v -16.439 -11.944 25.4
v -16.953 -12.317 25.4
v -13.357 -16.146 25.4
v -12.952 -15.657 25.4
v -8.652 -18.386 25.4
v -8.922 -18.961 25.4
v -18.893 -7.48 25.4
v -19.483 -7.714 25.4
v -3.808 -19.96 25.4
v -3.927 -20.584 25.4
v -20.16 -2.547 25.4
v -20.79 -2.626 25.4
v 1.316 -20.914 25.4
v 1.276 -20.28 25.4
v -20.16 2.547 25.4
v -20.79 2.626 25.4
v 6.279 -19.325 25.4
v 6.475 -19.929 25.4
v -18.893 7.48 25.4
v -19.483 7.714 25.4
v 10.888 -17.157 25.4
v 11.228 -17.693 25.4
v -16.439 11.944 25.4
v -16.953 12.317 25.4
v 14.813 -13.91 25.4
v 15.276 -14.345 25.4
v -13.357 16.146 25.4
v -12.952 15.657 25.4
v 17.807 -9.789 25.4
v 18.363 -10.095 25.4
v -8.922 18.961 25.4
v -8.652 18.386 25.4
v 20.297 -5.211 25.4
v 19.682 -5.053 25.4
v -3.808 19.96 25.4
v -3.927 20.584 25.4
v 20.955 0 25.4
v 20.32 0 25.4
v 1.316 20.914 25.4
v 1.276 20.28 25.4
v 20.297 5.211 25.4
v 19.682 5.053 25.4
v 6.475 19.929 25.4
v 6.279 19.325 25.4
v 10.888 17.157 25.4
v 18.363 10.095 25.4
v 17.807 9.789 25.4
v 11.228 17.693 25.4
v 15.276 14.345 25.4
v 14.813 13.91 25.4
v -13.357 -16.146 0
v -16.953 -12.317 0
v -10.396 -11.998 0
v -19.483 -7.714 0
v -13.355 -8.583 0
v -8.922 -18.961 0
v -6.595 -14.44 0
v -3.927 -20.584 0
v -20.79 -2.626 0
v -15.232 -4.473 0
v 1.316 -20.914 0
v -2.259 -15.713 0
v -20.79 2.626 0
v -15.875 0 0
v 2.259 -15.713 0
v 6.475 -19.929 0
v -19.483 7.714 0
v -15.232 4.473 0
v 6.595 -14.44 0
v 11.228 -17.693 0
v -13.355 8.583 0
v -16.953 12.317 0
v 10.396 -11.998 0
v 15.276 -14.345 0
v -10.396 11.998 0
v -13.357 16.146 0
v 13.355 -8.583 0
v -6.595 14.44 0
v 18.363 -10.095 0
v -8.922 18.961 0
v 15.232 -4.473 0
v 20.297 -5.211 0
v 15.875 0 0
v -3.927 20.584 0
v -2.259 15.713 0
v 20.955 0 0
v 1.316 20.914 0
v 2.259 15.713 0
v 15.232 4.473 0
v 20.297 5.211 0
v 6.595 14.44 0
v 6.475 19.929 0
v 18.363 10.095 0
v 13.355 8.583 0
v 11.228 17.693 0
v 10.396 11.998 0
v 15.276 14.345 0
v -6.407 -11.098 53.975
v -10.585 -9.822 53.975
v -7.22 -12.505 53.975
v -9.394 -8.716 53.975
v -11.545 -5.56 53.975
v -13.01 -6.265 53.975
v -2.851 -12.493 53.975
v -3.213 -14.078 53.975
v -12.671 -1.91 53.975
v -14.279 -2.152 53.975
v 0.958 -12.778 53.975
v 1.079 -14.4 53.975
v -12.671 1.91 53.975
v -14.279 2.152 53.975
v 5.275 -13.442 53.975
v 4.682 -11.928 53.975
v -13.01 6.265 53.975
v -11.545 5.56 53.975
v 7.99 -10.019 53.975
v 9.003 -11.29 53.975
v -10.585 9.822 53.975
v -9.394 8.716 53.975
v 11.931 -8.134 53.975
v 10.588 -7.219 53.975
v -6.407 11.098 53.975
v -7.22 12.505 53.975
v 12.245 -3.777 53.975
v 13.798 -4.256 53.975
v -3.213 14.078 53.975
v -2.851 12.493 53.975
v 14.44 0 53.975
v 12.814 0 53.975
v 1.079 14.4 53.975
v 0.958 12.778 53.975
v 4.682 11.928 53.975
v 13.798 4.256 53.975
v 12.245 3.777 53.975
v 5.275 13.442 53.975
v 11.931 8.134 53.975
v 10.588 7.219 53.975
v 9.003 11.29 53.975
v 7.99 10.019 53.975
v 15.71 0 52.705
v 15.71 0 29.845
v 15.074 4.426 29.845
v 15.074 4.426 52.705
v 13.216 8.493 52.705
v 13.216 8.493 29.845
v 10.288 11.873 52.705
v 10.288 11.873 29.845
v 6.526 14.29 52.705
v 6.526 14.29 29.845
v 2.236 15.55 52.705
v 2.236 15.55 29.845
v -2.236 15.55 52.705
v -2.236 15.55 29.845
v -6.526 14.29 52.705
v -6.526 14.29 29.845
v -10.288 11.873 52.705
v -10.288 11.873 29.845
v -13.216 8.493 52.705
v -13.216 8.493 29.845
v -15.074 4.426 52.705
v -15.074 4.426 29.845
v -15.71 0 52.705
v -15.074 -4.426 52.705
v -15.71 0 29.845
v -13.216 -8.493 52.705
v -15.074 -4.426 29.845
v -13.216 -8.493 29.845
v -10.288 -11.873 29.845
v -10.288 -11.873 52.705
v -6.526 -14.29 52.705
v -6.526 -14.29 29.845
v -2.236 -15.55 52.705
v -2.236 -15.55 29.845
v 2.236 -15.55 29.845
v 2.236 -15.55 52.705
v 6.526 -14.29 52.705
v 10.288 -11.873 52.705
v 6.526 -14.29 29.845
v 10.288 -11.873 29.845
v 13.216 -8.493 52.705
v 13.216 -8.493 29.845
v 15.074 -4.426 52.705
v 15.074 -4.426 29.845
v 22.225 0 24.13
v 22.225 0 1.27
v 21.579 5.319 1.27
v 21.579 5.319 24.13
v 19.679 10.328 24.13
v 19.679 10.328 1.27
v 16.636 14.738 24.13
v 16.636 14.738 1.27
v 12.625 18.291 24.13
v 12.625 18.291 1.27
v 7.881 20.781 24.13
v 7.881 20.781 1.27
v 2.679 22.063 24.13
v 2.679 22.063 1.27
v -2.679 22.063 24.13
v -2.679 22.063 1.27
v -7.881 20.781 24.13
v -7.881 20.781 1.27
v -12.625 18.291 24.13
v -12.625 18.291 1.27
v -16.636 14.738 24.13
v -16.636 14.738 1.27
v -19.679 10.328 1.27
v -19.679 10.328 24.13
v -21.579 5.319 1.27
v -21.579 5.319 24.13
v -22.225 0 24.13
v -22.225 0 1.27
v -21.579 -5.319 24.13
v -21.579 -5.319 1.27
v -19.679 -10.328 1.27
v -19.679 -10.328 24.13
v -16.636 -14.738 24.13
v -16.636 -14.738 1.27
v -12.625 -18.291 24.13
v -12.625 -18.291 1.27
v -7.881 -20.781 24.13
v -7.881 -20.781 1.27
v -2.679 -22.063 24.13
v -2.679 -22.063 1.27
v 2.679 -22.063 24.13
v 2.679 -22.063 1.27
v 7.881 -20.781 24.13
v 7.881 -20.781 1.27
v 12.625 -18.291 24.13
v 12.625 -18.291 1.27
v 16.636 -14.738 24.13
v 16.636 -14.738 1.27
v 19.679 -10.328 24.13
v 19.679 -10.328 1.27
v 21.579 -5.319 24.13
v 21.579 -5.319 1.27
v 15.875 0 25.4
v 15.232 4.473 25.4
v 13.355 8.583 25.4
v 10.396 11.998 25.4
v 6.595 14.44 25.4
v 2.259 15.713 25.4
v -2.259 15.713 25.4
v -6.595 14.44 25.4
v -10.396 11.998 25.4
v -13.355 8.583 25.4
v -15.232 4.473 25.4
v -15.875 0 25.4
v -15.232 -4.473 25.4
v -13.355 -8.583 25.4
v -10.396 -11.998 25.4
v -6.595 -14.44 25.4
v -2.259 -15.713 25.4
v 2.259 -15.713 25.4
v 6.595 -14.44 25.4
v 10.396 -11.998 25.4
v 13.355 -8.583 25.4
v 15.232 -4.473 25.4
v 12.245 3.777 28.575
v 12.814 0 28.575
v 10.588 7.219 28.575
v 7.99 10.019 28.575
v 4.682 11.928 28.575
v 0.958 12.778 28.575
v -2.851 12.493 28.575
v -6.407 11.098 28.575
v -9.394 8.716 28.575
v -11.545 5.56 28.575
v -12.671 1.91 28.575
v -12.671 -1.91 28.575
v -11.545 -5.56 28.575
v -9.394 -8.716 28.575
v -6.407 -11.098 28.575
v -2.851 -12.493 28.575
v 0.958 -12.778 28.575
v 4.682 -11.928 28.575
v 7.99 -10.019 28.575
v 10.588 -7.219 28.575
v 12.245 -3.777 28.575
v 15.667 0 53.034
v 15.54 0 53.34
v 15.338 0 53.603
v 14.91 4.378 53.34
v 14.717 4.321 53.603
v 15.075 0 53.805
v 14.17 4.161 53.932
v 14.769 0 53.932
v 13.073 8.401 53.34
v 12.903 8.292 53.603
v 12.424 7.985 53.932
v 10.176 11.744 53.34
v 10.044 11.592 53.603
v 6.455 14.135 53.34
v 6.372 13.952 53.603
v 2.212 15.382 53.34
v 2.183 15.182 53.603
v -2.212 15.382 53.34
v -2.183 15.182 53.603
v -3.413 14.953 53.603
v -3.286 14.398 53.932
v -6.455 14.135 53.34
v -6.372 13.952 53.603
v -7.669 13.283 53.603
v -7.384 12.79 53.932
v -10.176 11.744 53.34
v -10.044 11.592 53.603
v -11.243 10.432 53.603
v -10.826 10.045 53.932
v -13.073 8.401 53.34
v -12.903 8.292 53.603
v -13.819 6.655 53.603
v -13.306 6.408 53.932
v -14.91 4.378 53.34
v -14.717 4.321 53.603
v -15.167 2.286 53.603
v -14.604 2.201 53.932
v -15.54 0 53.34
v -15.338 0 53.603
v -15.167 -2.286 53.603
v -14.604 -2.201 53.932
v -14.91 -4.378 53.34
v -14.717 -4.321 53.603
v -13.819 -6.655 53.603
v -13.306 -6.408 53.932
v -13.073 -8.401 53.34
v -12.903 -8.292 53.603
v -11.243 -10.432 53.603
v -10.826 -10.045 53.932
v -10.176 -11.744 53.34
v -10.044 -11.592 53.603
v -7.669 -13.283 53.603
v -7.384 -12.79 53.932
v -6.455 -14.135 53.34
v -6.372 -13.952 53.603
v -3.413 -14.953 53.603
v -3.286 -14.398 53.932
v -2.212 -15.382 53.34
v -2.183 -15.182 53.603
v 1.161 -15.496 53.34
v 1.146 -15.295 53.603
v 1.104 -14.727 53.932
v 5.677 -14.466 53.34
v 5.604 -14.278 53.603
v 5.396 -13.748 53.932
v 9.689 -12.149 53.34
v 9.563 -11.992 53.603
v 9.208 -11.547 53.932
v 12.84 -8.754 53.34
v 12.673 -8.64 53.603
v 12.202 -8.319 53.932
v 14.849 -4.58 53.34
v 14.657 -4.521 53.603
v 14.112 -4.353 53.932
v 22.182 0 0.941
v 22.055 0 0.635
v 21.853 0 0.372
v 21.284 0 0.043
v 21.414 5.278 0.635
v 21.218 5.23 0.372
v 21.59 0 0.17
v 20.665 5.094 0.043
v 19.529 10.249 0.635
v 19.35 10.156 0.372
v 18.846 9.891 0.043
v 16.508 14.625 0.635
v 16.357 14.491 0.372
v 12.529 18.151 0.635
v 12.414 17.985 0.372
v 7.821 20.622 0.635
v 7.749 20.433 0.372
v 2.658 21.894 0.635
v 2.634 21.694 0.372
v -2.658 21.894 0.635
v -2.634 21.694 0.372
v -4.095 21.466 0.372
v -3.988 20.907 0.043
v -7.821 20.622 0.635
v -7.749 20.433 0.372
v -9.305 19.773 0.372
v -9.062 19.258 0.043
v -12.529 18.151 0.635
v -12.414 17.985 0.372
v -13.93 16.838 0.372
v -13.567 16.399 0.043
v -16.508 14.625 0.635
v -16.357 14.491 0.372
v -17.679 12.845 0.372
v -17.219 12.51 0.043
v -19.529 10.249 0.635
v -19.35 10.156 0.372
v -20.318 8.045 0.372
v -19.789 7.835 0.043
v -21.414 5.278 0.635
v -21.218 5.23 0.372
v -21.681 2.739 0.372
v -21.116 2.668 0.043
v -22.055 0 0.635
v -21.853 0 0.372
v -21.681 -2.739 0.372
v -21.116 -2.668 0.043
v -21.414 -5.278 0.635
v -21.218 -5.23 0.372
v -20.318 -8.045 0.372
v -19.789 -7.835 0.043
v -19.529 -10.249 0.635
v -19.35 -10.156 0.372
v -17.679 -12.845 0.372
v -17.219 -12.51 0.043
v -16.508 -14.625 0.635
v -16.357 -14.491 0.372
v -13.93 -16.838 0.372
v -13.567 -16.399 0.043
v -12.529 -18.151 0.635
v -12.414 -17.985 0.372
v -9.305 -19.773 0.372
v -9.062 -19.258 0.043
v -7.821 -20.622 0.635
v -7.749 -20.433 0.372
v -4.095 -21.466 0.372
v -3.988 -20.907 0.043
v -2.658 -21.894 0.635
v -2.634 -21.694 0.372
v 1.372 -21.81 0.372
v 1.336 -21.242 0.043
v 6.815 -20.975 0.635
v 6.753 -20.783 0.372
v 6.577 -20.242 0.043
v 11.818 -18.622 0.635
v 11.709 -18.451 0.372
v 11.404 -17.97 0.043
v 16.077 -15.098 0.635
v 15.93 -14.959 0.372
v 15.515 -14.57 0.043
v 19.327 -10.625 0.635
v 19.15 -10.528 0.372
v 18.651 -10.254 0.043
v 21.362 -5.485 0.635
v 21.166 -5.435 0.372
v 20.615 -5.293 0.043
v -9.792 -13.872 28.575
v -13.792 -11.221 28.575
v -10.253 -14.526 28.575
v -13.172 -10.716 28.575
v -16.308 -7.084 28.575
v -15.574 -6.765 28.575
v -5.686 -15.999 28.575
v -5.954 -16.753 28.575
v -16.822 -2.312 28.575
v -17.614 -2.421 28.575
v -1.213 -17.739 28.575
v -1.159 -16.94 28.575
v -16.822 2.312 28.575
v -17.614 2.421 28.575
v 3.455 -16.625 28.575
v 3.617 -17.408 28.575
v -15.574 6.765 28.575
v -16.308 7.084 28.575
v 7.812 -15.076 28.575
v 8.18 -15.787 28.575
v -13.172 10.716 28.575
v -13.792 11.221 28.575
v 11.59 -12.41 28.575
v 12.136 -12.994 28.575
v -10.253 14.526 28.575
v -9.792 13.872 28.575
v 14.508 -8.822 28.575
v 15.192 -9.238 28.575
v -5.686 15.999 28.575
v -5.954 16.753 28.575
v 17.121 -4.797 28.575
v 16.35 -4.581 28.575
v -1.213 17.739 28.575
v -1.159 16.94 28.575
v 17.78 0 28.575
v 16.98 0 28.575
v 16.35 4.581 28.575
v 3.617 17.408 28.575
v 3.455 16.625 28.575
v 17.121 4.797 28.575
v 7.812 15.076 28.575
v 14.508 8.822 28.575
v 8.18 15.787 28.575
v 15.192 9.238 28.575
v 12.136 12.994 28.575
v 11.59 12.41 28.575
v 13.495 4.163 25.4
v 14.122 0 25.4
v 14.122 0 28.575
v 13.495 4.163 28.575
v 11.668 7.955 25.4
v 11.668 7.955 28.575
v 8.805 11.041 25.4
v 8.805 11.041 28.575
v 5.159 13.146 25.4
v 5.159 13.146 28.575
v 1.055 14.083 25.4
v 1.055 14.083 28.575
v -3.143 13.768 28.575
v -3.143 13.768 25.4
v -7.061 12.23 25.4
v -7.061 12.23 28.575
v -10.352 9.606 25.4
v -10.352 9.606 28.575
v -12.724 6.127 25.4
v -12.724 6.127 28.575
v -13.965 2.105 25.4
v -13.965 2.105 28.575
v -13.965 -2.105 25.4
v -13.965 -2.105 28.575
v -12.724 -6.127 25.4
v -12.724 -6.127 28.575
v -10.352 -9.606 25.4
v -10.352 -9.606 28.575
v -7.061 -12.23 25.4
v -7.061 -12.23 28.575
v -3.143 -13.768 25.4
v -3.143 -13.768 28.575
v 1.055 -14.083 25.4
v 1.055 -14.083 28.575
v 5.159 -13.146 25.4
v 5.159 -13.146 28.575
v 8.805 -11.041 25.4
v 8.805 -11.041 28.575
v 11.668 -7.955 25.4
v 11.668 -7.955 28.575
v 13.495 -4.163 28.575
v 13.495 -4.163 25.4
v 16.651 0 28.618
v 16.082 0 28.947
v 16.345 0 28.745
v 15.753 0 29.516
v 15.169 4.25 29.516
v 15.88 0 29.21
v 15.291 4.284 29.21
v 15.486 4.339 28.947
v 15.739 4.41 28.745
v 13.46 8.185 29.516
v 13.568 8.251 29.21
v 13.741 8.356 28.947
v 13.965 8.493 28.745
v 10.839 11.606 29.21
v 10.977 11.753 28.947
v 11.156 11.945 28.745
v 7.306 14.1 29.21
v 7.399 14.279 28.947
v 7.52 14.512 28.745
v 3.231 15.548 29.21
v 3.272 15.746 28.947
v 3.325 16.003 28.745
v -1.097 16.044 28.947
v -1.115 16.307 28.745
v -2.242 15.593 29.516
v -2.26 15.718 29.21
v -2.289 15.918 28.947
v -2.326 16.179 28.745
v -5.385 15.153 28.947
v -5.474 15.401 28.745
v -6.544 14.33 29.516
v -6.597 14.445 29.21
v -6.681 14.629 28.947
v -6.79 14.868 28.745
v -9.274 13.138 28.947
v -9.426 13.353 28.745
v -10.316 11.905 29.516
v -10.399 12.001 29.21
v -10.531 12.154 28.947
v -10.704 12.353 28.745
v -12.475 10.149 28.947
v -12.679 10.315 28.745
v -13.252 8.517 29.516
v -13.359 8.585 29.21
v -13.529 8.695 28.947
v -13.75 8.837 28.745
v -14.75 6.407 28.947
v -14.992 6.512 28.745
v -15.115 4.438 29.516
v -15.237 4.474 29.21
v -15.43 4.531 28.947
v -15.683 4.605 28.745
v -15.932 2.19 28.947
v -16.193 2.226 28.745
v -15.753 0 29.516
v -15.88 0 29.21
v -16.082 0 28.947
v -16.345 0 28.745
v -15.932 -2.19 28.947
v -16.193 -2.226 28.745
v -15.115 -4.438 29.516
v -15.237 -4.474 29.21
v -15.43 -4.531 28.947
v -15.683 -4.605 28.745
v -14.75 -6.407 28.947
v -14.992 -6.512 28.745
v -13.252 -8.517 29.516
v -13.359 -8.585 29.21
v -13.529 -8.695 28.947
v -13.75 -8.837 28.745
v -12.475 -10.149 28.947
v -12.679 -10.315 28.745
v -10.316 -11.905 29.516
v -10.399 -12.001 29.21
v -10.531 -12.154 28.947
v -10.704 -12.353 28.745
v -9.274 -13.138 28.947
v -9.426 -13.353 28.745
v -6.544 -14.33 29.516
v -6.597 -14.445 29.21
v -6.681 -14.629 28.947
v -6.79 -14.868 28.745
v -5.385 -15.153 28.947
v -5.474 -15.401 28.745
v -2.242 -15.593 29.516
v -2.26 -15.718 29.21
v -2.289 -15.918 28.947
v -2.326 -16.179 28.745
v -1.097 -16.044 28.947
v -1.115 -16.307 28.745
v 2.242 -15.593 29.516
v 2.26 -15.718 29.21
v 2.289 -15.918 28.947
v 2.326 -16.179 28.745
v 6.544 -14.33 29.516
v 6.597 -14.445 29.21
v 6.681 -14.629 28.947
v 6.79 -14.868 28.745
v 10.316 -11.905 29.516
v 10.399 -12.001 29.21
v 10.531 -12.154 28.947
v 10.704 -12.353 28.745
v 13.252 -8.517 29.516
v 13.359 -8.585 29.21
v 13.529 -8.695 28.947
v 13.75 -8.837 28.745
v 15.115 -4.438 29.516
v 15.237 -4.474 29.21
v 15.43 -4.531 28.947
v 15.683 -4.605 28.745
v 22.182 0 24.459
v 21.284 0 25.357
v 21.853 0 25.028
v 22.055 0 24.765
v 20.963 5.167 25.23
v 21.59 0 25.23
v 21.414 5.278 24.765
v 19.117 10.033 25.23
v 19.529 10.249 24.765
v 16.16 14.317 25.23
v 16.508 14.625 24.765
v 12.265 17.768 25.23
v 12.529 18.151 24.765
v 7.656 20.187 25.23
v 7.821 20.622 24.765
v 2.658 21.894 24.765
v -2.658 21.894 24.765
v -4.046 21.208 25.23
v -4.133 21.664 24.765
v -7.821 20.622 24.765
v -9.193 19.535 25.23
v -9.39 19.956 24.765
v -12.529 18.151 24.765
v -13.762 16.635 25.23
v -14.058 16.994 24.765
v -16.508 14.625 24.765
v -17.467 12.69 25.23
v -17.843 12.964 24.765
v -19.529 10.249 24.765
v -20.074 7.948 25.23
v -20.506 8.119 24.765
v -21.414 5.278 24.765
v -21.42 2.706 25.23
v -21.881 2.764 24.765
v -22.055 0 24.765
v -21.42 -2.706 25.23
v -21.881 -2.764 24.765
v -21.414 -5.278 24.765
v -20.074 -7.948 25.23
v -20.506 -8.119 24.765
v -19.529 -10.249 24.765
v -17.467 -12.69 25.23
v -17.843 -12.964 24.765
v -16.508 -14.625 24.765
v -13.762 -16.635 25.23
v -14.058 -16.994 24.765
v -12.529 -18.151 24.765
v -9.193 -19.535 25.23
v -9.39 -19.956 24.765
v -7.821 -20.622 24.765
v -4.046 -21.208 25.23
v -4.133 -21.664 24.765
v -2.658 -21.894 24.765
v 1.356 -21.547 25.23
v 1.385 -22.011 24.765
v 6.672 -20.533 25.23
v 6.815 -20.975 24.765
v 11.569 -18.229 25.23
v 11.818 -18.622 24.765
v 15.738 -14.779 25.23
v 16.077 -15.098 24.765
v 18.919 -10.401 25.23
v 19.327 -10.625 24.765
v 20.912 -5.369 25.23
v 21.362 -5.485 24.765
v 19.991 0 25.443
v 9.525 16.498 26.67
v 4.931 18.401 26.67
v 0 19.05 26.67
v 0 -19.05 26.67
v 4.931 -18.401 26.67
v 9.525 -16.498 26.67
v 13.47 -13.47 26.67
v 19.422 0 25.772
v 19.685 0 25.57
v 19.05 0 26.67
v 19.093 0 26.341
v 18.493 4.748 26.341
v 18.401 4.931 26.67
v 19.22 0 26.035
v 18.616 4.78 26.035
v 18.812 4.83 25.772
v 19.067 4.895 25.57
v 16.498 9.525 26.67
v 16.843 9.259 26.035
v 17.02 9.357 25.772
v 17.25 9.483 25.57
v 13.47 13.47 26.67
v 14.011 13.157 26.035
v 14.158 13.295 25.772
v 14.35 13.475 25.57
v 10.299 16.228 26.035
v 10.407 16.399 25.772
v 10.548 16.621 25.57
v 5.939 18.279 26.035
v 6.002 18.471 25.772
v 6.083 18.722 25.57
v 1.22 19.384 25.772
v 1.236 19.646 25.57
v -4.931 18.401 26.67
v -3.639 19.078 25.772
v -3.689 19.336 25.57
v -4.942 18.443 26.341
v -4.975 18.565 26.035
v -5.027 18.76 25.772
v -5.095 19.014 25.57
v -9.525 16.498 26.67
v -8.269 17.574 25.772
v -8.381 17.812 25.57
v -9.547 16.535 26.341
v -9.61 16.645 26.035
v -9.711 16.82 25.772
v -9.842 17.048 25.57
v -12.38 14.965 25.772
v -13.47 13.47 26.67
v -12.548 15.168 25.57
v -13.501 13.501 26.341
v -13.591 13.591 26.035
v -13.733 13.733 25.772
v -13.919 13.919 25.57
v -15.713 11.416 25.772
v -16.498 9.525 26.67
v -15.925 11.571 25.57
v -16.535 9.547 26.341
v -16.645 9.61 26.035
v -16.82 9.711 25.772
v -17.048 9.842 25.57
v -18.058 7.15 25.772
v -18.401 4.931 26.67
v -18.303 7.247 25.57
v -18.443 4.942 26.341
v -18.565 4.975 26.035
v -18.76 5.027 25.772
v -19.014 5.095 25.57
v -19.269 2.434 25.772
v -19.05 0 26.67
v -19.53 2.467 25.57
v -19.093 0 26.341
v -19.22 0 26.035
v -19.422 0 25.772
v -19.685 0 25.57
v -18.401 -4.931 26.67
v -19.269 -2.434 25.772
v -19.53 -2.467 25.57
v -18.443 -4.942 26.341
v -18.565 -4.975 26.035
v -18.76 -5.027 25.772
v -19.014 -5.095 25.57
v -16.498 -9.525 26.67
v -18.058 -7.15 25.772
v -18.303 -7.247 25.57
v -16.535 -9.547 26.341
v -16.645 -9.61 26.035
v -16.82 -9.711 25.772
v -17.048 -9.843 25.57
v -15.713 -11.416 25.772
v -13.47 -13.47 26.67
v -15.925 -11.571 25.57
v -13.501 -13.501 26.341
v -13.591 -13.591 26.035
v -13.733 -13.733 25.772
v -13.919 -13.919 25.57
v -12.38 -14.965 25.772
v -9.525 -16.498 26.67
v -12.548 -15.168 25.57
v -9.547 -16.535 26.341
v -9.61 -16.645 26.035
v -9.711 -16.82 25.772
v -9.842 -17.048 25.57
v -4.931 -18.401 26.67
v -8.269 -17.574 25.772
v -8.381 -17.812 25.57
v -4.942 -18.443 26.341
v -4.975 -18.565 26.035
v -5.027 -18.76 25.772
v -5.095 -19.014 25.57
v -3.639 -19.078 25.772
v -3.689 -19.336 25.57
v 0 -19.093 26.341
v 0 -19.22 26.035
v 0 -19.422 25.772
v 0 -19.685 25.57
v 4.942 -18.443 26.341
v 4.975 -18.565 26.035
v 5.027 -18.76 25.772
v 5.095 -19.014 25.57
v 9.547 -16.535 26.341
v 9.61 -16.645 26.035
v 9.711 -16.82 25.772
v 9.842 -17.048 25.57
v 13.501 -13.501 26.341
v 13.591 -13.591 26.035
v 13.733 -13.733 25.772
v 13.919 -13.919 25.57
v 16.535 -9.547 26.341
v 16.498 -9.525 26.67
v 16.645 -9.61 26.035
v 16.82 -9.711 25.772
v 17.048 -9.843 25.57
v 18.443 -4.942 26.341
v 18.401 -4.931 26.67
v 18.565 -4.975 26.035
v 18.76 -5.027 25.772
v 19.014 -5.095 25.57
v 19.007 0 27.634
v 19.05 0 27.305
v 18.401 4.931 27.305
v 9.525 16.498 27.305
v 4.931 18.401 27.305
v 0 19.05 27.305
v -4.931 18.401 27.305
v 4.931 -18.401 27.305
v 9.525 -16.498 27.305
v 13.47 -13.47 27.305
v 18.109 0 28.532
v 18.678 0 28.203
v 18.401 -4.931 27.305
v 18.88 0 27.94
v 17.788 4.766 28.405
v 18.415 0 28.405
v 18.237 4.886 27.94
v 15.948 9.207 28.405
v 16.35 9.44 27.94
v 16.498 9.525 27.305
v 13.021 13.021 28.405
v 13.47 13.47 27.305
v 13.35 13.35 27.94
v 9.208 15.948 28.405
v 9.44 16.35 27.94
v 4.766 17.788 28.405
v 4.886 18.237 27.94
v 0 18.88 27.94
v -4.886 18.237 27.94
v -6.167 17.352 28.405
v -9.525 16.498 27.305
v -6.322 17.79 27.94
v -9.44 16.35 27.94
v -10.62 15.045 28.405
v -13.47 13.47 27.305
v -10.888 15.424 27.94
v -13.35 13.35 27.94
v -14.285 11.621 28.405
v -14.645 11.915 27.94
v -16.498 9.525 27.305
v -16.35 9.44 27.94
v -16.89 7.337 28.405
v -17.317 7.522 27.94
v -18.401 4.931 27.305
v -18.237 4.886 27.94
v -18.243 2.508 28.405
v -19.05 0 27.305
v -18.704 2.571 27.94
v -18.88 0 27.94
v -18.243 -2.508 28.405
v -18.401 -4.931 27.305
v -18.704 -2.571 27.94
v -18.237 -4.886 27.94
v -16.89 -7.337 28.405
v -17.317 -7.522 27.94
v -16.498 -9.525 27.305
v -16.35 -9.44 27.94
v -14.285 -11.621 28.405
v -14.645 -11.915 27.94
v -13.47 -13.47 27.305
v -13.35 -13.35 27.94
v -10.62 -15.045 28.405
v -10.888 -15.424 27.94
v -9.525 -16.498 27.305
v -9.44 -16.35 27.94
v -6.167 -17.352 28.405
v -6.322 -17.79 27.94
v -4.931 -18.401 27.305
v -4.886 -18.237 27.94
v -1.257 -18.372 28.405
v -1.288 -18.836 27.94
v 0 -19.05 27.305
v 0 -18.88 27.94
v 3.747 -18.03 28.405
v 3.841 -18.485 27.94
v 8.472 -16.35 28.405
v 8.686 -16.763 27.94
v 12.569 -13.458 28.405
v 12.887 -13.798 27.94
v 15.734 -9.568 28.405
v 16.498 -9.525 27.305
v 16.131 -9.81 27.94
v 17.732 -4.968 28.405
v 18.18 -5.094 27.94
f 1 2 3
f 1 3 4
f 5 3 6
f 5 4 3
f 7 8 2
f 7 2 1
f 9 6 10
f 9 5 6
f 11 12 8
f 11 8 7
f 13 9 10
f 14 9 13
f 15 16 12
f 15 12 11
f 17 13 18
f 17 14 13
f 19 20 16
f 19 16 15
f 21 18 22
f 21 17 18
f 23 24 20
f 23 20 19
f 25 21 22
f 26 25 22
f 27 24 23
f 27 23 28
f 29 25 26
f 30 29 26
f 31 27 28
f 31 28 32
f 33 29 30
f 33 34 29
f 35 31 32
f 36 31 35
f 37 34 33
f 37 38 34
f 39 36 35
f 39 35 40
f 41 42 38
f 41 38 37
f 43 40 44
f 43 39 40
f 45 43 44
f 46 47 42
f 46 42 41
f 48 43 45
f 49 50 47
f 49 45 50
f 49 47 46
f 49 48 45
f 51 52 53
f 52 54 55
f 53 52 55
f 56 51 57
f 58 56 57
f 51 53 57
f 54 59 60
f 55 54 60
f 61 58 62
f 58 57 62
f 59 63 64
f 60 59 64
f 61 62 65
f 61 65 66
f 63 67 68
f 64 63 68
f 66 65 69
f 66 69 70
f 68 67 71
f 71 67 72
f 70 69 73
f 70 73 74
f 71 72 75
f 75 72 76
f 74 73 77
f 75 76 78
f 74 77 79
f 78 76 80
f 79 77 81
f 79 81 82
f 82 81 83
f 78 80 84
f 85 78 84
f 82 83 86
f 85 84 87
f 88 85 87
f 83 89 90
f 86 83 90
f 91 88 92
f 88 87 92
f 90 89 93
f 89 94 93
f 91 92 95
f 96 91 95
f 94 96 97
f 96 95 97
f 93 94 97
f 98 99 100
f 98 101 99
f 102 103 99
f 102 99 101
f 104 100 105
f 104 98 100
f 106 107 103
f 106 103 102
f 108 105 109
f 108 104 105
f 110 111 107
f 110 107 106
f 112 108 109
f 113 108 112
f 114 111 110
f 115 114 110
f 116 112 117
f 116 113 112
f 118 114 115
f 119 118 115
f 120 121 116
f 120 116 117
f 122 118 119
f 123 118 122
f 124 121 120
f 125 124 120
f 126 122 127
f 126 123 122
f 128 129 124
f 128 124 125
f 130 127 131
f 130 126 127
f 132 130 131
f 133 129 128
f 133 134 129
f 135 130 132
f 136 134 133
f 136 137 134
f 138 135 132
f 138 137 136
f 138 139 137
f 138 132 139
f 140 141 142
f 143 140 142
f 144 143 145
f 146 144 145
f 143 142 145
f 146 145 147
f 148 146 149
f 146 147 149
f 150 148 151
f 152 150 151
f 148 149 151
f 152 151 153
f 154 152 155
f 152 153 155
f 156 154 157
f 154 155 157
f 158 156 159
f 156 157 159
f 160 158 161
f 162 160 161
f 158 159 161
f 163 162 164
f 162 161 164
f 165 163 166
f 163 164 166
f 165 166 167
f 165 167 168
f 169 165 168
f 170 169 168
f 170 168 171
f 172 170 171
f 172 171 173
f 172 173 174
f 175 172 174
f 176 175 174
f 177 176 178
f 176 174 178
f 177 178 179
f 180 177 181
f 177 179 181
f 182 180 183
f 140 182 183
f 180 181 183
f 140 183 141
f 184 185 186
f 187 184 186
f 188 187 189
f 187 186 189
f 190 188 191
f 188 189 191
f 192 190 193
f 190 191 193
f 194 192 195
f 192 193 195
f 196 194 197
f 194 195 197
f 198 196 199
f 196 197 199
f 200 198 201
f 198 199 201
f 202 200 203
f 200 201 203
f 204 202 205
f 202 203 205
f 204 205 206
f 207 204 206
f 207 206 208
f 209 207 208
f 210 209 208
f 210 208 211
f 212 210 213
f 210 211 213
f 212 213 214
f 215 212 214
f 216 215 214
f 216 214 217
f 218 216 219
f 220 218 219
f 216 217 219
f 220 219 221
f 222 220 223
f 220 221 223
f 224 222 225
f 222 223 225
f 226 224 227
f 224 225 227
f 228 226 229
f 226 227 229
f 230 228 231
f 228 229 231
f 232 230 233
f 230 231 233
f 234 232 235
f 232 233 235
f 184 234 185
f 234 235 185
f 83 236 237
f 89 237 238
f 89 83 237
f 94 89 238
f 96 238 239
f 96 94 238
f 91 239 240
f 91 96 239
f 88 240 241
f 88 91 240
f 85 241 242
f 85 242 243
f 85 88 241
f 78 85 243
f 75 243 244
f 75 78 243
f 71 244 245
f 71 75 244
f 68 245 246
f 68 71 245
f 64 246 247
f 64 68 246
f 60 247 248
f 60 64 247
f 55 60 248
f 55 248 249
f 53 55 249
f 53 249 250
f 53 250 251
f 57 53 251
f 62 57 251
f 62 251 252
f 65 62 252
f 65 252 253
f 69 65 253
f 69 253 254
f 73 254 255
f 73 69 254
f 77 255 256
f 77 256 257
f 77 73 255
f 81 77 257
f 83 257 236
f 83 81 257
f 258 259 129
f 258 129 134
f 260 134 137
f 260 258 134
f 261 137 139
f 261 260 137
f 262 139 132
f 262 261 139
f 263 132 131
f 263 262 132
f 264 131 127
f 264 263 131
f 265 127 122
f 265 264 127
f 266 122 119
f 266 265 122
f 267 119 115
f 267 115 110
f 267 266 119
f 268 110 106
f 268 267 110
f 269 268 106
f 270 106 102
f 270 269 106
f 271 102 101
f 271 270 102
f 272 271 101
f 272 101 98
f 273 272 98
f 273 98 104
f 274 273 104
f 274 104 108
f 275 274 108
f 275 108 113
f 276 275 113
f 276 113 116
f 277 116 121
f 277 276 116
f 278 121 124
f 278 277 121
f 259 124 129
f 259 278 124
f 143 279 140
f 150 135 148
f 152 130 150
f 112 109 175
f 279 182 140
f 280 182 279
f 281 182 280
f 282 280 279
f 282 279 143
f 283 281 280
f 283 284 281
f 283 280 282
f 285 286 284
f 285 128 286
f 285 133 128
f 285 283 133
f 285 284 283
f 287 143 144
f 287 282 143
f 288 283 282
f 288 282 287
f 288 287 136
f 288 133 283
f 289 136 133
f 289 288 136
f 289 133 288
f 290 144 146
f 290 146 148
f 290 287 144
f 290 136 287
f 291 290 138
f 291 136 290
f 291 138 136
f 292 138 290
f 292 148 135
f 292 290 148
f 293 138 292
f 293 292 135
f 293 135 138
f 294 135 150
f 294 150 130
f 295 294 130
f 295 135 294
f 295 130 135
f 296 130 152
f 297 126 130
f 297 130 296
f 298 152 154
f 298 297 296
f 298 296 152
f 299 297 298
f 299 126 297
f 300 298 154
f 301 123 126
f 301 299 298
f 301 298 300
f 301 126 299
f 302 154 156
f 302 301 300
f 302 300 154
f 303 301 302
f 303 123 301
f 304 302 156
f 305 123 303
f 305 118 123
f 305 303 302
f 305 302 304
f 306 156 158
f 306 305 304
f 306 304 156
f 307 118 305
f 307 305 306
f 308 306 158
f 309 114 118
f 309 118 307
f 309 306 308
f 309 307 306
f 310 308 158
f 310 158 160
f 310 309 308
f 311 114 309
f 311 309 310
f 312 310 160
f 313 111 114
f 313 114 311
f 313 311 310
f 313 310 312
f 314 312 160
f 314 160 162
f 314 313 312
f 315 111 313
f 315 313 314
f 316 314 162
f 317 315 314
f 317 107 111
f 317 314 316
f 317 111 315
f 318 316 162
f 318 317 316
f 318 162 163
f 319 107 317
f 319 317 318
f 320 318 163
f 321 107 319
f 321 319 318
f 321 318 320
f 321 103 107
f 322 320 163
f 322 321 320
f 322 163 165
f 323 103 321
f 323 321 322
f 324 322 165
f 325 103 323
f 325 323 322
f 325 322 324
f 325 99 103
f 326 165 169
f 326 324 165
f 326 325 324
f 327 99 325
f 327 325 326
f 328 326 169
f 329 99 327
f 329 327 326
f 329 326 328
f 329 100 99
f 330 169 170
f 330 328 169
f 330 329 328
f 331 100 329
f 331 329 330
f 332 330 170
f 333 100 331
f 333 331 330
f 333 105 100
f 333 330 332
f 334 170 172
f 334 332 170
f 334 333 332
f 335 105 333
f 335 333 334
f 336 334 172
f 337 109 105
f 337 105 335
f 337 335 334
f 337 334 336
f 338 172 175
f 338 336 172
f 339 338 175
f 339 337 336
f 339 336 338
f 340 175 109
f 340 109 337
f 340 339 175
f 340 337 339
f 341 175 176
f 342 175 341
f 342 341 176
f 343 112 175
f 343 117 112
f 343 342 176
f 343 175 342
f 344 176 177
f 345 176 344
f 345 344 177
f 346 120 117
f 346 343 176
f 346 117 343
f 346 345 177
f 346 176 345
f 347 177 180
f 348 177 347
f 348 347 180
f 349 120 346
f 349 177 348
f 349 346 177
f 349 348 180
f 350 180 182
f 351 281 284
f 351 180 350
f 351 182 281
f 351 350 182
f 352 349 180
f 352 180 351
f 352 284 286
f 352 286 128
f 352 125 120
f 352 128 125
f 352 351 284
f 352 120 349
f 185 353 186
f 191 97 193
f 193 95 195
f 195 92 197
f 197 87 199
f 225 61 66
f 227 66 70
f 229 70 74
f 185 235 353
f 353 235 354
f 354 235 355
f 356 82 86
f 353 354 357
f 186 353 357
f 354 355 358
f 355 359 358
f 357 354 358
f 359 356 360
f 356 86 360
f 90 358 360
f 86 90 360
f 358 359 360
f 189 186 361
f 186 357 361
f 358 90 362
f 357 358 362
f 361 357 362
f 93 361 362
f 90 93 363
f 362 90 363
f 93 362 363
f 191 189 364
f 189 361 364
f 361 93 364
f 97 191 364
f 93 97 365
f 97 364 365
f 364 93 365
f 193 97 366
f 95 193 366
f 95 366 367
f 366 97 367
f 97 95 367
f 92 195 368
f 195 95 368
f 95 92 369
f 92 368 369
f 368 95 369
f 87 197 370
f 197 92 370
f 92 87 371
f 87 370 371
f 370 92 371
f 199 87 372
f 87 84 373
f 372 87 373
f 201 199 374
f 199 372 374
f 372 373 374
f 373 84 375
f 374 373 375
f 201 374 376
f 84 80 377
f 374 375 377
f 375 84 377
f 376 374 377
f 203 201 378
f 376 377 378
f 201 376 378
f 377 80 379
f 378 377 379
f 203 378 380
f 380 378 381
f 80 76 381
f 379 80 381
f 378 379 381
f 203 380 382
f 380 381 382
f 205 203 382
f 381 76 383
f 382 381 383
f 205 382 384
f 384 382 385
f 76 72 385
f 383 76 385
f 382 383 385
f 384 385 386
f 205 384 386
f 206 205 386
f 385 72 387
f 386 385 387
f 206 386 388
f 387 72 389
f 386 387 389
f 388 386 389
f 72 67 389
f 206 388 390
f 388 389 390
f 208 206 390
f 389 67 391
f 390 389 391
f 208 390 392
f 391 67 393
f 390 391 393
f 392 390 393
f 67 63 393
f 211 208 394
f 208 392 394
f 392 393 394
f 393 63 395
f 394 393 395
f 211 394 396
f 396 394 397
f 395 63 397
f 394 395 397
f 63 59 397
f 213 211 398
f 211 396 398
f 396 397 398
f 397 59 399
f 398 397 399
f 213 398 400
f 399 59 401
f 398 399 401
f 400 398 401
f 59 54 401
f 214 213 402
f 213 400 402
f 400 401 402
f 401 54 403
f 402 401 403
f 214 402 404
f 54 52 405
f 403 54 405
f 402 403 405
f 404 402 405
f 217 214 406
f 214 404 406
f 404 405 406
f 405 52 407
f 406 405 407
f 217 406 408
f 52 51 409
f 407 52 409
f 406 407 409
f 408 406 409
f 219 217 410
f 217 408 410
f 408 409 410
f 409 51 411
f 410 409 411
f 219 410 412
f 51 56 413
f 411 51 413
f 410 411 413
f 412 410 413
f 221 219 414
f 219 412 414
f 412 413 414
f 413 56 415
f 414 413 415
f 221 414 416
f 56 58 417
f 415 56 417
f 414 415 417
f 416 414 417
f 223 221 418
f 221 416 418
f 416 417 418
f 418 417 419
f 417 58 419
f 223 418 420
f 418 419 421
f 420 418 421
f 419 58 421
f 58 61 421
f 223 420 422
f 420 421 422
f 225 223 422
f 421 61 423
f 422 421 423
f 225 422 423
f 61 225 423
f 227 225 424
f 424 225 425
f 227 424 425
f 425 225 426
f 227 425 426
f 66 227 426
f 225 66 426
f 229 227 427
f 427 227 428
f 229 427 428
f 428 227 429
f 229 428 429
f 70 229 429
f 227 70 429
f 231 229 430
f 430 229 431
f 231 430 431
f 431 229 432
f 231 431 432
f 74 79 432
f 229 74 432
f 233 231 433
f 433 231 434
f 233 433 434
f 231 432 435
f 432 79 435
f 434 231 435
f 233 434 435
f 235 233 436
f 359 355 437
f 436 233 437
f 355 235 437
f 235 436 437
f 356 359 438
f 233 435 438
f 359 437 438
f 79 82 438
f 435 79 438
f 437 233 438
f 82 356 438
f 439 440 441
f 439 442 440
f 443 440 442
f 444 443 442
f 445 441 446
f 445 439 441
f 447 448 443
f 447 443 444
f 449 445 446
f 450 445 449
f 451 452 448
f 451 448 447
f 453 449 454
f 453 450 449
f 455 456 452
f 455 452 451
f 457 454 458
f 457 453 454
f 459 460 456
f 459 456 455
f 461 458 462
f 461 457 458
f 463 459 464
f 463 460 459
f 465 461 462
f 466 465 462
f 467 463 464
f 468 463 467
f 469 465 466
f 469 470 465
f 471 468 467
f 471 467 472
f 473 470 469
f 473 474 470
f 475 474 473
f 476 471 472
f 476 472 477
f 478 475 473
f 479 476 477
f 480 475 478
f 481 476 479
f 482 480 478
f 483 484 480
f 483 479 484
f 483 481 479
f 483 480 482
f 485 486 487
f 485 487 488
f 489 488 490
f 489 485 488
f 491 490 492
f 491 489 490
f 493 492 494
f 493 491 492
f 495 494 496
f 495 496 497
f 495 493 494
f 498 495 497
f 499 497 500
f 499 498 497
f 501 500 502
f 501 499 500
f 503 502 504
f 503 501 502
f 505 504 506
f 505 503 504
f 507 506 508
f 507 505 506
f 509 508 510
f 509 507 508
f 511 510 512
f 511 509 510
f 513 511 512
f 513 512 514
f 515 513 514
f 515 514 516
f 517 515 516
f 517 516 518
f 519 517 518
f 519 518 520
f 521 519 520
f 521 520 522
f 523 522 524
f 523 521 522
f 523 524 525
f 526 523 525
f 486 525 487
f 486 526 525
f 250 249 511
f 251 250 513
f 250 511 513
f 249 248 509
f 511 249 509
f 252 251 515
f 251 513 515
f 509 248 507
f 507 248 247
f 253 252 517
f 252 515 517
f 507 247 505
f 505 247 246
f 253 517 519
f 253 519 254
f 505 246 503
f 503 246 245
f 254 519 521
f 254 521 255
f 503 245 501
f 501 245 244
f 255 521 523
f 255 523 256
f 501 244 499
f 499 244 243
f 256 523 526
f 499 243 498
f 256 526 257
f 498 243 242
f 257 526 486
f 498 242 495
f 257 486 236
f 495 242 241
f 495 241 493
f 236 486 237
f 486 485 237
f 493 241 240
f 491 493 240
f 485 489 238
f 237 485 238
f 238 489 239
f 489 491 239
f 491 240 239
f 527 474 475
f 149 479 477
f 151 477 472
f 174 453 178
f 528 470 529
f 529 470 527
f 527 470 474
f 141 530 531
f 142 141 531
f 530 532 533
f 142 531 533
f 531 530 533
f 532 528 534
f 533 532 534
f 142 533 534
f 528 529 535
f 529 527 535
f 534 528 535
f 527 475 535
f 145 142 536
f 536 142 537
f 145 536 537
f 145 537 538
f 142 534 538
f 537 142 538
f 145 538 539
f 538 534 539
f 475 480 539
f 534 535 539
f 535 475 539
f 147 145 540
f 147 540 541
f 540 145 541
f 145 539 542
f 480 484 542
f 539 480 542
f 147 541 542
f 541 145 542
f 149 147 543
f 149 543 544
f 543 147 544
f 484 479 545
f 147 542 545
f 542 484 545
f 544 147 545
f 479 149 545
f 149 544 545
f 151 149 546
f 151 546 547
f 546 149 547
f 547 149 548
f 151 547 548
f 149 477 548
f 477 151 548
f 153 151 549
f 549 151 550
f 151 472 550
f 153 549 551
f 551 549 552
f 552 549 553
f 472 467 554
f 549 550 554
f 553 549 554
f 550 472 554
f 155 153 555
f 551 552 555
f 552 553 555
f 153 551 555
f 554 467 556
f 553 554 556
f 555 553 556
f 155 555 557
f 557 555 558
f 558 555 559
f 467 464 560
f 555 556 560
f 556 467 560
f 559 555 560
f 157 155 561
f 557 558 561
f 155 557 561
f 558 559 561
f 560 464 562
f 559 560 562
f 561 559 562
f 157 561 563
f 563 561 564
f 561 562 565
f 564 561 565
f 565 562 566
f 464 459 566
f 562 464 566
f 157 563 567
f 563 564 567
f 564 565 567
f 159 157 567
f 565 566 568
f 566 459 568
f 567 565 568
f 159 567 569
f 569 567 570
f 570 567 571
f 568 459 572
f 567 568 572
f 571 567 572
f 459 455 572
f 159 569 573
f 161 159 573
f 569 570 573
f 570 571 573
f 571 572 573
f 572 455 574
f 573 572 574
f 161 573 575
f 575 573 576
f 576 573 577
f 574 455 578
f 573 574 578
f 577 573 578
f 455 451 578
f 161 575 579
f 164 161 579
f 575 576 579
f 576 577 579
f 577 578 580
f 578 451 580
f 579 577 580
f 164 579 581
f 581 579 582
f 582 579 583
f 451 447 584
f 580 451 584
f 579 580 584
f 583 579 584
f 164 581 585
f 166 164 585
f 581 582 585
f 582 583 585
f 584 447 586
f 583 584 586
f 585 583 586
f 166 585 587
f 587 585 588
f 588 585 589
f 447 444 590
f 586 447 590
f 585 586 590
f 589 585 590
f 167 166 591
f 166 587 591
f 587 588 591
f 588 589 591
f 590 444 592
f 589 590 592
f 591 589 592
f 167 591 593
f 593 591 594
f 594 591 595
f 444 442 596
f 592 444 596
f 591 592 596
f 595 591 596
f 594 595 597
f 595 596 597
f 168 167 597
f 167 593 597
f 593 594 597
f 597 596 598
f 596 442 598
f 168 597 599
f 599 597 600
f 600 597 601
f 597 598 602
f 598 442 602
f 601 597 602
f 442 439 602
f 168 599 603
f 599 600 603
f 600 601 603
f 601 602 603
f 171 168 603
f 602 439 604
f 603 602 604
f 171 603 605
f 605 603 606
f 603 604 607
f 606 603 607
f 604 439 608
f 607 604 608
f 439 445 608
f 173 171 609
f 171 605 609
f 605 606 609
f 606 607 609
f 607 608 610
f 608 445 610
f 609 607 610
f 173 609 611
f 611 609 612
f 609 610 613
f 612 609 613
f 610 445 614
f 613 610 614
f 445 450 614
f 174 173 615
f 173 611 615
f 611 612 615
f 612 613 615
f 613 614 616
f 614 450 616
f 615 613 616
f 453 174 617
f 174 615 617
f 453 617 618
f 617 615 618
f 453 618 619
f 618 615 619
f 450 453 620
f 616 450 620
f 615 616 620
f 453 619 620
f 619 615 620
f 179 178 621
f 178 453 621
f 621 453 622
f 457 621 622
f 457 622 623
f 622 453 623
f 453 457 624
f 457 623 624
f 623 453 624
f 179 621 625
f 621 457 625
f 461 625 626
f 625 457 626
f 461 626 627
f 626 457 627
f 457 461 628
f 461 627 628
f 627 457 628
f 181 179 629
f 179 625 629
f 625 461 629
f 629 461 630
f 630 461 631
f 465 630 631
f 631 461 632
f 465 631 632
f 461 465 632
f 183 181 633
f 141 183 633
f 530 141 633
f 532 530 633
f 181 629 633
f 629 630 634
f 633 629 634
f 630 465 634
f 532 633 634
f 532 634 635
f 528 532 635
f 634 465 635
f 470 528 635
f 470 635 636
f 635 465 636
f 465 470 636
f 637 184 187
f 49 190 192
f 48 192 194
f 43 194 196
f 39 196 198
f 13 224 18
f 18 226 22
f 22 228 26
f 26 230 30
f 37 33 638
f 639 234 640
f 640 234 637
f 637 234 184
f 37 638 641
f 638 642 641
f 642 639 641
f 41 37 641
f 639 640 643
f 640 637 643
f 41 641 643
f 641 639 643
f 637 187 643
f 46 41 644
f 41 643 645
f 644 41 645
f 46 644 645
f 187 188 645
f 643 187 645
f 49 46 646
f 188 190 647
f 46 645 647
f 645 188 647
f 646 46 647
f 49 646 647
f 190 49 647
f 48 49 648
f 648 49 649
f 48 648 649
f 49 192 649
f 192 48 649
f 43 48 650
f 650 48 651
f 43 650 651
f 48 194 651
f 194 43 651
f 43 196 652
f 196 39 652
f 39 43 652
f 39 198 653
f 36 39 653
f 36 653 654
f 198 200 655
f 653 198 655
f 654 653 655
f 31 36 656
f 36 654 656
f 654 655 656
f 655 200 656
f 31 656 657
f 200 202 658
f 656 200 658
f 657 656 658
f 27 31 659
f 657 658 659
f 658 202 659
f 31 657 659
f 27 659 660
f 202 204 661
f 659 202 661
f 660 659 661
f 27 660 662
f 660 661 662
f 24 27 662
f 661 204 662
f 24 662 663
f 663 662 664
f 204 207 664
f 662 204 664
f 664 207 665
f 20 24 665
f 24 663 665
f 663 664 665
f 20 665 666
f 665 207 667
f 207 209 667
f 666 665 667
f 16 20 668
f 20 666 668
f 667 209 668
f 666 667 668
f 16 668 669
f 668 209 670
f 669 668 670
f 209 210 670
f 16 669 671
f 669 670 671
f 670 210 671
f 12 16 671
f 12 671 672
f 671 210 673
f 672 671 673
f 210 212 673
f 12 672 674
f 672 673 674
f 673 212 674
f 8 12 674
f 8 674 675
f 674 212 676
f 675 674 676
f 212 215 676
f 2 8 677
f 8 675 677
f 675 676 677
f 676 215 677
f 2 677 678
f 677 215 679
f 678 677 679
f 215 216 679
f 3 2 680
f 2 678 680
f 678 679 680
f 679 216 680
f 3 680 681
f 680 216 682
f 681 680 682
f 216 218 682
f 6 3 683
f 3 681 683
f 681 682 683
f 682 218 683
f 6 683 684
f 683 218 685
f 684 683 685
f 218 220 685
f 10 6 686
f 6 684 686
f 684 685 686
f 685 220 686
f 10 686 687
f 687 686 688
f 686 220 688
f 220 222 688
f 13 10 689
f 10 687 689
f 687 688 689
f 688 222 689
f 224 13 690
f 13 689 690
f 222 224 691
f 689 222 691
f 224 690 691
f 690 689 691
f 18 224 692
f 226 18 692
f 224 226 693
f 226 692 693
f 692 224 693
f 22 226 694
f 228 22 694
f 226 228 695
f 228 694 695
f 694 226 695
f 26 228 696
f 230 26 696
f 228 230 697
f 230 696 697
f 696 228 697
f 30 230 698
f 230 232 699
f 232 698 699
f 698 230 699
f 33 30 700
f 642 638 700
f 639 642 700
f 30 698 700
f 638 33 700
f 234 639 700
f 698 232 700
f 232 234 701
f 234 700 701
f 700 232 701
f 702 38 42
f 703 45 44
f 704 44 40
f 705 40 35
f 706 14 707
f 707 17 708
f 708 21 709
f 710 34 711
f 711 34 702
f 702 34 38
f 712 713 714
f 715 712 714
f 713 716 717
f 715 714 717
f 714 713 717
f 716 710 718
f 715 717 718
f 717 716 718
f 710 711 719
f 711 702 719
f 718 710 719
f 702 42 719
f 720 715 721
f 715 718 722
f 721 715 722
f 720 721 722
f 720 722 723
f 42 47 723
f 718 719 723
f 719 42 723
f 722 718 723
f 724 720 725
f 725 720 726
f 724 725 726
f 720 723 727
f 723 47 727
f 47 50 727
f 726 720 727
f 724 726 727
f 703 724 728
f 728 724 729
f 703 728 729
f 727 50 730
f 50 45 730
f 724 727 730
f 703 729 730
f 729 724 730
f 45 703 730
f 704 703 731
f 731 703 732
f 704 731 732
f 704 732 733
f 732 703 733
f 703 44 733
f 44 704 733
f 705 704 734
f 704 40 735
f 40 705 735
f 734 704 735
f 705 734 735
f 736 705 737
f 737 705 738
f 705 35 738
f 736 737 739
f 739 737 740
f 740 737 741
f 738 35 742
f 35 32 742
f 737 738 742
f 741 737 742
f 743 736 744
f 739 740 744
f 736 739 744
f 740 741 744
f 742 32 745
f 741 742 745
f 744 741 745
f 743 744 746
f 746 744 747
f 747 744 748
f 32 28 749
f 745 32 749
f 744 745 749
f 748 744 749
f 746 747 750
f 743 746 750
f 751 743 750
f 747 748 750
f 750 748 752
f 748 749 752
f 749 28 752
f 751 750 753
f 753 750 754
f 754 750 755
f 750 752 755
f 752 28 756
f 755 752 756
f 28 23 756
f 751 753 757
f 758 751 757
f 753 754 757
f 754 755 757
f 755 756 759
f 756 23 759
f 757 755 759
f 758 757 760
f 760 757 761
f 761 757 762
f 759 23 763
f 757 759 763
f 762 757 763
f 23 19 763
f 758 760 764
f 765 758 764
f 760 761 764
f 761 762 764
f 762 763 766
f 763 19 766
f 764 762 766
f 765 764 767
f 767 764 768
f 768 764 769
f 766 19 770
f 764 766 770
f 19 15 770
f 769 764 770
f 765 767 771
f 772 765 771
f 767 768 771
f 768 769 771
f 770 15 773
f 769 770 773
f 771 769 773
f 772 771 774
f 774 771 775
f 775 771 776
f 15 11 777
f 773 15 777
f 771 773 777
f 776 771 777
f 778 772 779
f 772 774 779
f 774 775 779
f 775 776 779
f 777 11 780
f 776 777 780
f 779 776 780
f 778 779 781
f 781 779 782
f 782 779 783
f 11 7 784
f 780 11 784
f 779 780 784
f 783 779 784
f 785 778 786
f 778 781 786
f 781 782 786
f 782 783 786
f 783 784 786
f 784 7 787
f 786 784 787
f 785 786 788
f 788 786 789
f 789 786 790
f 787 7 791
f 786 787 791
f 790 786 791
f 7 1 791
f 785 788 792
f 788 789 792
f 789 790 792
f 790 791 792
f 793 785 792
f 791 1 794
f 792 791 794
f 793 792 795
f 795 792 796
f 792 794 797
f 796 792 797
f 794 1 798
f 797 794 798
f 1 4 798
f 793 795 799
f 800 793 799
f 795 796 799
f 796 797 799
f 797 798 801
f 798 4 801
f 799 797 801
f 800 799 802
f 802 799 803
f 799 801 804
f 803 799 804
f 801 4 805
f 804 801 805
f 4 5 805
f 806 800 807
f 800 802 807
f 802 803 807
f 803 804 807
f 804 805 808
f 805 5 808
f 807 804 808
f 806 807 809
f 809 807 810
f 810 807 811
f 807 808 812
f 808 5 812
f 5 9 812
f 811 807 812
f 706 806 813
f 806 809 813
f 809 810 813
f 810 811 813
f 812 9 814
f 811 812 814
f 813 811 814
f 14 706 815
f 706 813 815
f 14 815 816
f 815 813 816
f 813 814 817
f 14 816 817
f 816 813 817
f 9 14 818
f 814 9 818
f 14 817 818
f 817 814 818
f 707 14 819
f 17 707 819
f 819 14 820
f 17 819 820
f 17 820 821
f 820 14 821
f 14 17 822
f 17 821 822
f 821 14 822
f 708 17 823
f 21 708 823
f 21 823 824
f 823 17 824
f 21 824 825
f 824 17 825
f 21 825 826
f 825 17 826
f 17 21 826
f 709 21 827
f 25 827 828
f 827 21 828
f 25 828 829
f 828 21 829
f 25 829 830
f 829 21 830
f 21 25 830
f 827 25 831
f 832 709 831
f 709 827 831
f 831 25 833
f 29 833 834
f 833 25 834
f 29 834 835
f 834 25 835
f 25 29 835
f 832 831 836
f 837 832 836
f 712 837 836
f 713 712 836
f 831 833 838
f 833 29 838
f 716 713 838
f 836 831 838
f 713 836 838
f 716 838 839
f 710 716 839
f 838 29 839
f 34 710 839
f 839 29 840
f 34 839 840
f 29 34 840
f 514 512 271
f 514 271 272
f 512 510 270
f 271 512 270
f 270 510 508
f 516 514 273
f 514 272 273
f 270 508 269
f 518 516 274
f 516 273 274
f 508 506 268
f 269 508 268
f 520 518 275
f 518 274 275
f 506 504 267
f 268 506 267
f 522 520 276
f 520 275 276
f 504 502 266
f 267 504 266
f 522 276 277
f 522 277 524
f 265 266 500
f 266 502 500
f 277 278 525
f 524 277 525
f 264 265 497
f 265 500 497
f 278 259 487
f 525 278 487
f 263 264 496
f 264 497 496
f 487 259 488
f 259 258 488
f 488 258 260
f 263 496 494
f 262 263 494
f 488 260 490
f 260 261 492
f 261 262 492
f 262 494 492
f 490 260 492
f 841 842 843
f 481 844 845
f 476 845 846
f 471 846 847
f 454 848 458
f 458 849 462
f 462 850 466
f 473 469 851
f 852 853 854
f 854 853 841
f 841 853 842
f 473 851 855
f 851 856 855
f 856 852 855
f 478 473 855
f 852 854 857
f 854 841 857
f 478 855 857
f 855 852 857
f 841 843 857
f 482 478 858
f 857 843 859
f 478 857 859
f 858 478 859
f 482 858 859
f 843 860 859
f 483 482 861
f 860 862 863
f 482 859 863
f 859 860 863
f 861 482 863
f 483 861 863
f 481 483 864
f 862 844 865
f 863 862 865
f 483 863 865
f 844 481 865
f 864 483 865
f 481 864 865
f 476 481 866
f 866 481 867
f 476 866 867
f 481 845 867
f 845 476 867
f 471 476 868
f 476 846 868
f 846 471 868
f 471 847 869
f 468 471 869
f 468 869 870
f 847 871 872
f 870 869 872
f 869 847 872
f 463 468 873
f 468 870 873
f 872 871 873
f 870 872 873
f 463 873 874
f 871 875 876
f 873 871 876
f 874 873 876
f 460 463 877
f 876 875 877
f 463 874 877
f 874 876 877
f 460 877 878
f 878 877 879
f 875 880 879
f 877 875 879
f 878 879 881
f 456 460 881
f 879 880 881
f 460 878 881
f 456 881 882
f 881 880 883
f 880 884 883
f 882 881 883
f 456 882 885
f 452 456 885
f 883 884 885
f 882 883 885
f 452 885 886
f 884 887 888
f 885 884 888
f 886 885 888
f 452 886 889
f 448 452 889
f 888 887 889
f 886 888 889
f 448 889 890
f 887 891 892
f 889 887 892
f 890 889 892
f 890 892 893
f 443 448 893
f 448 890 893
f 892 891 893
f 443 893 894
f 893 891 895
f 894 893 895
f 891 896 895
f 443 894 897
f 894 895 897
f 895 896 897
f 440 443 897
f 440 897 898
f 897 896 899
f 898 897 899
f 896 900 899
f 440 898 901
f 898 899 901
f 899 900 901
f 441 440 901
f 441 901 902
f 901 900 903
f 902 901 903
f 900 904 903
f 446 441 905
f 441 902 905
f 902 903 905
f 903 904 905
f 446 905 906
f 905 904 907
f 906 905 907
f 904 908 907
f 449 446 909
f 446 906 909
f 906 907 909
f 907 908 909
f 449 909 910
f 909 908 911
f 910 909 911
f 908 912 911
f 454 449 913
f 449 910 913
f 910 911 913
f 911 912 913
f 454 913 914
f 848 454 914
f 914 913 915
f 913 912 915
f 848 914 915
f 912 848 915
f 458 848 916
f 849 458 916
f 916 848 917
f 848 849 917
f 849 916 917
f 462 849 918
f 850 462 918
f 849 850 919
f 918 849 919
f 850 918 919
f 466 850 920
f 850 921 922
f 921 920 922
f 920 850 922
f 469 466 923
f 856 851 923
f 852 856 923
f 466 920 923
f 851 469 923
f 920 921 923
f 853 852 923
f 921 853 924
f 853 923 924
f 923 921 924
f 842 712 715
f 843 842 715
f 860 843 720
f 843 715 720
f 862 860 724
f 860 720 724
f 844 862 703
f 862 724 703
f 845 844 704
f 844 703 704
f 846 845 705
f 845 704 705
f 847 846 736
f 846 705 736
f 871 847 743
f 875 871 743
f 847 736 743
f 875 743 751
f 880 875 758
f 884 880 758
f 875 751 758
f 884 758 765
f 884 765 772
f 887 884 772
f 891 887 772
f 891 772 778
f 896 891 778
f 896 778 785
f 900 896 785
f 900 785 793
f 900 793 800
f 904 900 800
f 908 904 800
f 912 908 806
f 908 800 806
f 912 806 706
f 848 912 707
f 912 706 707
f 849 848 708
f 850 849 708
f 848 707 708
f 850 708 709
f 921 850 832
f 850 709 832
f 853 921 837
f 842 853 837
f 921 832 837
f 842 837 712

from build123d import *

# Parameters (mm, degrees)
F0_R     = 22.225
F0_R_2   = 15.875
F1_DEPTH = 25.4
F2_R     = 19.05
F2_R_2   = 14.1224
F3_DEPTH = 3.175
F4_R     = 15.7099
F4_R_2   = 12.8143
F5_DEPTH = 25.4
F6_R     = 1.27


with BuildPart() as f1:
    # F0 (on Top) → F1 (new body)
    with BuildSketch(Plane.XY):
        Circle(F0_R)
        Circle(F0_R_2, mode=Mode.SUBTRACT)
    extrude(amount=F1_DEPTH)

    # F2 (on face) → F3 (join)
    with BuildSketch(Plane.XY.offset(25.4)):
        Circle(F2_R)
        Circle(F2_R_2, mode=Mode.SUBTRACT)
    extrude(amount=F3_DEPTH)

    # F4 (on face) → F5 (join)
    with BuildSketch(Plane.XY.offset(28.575)):
        Circle(F4_R)
        Circle(F4_R_2, mode=Mode.SUBTRACT)
    extrude(amount=F5_DEPTH)

    # F6
    f6_edges = [f1.edges().sort_by_distance(p)[0] for p in [
        (-15.7099, 0, 53.975),
        (-19.05, 0, 28.575),
        (-22.225, 0, 25.4),
        (-15.7099, 0, 28.575),
        (-22.225, 0, 0),
        (-19.05, 0, 25.4),
    ]]
    fillet(f6_edges, radius=F6_R)


solid = f1.part
